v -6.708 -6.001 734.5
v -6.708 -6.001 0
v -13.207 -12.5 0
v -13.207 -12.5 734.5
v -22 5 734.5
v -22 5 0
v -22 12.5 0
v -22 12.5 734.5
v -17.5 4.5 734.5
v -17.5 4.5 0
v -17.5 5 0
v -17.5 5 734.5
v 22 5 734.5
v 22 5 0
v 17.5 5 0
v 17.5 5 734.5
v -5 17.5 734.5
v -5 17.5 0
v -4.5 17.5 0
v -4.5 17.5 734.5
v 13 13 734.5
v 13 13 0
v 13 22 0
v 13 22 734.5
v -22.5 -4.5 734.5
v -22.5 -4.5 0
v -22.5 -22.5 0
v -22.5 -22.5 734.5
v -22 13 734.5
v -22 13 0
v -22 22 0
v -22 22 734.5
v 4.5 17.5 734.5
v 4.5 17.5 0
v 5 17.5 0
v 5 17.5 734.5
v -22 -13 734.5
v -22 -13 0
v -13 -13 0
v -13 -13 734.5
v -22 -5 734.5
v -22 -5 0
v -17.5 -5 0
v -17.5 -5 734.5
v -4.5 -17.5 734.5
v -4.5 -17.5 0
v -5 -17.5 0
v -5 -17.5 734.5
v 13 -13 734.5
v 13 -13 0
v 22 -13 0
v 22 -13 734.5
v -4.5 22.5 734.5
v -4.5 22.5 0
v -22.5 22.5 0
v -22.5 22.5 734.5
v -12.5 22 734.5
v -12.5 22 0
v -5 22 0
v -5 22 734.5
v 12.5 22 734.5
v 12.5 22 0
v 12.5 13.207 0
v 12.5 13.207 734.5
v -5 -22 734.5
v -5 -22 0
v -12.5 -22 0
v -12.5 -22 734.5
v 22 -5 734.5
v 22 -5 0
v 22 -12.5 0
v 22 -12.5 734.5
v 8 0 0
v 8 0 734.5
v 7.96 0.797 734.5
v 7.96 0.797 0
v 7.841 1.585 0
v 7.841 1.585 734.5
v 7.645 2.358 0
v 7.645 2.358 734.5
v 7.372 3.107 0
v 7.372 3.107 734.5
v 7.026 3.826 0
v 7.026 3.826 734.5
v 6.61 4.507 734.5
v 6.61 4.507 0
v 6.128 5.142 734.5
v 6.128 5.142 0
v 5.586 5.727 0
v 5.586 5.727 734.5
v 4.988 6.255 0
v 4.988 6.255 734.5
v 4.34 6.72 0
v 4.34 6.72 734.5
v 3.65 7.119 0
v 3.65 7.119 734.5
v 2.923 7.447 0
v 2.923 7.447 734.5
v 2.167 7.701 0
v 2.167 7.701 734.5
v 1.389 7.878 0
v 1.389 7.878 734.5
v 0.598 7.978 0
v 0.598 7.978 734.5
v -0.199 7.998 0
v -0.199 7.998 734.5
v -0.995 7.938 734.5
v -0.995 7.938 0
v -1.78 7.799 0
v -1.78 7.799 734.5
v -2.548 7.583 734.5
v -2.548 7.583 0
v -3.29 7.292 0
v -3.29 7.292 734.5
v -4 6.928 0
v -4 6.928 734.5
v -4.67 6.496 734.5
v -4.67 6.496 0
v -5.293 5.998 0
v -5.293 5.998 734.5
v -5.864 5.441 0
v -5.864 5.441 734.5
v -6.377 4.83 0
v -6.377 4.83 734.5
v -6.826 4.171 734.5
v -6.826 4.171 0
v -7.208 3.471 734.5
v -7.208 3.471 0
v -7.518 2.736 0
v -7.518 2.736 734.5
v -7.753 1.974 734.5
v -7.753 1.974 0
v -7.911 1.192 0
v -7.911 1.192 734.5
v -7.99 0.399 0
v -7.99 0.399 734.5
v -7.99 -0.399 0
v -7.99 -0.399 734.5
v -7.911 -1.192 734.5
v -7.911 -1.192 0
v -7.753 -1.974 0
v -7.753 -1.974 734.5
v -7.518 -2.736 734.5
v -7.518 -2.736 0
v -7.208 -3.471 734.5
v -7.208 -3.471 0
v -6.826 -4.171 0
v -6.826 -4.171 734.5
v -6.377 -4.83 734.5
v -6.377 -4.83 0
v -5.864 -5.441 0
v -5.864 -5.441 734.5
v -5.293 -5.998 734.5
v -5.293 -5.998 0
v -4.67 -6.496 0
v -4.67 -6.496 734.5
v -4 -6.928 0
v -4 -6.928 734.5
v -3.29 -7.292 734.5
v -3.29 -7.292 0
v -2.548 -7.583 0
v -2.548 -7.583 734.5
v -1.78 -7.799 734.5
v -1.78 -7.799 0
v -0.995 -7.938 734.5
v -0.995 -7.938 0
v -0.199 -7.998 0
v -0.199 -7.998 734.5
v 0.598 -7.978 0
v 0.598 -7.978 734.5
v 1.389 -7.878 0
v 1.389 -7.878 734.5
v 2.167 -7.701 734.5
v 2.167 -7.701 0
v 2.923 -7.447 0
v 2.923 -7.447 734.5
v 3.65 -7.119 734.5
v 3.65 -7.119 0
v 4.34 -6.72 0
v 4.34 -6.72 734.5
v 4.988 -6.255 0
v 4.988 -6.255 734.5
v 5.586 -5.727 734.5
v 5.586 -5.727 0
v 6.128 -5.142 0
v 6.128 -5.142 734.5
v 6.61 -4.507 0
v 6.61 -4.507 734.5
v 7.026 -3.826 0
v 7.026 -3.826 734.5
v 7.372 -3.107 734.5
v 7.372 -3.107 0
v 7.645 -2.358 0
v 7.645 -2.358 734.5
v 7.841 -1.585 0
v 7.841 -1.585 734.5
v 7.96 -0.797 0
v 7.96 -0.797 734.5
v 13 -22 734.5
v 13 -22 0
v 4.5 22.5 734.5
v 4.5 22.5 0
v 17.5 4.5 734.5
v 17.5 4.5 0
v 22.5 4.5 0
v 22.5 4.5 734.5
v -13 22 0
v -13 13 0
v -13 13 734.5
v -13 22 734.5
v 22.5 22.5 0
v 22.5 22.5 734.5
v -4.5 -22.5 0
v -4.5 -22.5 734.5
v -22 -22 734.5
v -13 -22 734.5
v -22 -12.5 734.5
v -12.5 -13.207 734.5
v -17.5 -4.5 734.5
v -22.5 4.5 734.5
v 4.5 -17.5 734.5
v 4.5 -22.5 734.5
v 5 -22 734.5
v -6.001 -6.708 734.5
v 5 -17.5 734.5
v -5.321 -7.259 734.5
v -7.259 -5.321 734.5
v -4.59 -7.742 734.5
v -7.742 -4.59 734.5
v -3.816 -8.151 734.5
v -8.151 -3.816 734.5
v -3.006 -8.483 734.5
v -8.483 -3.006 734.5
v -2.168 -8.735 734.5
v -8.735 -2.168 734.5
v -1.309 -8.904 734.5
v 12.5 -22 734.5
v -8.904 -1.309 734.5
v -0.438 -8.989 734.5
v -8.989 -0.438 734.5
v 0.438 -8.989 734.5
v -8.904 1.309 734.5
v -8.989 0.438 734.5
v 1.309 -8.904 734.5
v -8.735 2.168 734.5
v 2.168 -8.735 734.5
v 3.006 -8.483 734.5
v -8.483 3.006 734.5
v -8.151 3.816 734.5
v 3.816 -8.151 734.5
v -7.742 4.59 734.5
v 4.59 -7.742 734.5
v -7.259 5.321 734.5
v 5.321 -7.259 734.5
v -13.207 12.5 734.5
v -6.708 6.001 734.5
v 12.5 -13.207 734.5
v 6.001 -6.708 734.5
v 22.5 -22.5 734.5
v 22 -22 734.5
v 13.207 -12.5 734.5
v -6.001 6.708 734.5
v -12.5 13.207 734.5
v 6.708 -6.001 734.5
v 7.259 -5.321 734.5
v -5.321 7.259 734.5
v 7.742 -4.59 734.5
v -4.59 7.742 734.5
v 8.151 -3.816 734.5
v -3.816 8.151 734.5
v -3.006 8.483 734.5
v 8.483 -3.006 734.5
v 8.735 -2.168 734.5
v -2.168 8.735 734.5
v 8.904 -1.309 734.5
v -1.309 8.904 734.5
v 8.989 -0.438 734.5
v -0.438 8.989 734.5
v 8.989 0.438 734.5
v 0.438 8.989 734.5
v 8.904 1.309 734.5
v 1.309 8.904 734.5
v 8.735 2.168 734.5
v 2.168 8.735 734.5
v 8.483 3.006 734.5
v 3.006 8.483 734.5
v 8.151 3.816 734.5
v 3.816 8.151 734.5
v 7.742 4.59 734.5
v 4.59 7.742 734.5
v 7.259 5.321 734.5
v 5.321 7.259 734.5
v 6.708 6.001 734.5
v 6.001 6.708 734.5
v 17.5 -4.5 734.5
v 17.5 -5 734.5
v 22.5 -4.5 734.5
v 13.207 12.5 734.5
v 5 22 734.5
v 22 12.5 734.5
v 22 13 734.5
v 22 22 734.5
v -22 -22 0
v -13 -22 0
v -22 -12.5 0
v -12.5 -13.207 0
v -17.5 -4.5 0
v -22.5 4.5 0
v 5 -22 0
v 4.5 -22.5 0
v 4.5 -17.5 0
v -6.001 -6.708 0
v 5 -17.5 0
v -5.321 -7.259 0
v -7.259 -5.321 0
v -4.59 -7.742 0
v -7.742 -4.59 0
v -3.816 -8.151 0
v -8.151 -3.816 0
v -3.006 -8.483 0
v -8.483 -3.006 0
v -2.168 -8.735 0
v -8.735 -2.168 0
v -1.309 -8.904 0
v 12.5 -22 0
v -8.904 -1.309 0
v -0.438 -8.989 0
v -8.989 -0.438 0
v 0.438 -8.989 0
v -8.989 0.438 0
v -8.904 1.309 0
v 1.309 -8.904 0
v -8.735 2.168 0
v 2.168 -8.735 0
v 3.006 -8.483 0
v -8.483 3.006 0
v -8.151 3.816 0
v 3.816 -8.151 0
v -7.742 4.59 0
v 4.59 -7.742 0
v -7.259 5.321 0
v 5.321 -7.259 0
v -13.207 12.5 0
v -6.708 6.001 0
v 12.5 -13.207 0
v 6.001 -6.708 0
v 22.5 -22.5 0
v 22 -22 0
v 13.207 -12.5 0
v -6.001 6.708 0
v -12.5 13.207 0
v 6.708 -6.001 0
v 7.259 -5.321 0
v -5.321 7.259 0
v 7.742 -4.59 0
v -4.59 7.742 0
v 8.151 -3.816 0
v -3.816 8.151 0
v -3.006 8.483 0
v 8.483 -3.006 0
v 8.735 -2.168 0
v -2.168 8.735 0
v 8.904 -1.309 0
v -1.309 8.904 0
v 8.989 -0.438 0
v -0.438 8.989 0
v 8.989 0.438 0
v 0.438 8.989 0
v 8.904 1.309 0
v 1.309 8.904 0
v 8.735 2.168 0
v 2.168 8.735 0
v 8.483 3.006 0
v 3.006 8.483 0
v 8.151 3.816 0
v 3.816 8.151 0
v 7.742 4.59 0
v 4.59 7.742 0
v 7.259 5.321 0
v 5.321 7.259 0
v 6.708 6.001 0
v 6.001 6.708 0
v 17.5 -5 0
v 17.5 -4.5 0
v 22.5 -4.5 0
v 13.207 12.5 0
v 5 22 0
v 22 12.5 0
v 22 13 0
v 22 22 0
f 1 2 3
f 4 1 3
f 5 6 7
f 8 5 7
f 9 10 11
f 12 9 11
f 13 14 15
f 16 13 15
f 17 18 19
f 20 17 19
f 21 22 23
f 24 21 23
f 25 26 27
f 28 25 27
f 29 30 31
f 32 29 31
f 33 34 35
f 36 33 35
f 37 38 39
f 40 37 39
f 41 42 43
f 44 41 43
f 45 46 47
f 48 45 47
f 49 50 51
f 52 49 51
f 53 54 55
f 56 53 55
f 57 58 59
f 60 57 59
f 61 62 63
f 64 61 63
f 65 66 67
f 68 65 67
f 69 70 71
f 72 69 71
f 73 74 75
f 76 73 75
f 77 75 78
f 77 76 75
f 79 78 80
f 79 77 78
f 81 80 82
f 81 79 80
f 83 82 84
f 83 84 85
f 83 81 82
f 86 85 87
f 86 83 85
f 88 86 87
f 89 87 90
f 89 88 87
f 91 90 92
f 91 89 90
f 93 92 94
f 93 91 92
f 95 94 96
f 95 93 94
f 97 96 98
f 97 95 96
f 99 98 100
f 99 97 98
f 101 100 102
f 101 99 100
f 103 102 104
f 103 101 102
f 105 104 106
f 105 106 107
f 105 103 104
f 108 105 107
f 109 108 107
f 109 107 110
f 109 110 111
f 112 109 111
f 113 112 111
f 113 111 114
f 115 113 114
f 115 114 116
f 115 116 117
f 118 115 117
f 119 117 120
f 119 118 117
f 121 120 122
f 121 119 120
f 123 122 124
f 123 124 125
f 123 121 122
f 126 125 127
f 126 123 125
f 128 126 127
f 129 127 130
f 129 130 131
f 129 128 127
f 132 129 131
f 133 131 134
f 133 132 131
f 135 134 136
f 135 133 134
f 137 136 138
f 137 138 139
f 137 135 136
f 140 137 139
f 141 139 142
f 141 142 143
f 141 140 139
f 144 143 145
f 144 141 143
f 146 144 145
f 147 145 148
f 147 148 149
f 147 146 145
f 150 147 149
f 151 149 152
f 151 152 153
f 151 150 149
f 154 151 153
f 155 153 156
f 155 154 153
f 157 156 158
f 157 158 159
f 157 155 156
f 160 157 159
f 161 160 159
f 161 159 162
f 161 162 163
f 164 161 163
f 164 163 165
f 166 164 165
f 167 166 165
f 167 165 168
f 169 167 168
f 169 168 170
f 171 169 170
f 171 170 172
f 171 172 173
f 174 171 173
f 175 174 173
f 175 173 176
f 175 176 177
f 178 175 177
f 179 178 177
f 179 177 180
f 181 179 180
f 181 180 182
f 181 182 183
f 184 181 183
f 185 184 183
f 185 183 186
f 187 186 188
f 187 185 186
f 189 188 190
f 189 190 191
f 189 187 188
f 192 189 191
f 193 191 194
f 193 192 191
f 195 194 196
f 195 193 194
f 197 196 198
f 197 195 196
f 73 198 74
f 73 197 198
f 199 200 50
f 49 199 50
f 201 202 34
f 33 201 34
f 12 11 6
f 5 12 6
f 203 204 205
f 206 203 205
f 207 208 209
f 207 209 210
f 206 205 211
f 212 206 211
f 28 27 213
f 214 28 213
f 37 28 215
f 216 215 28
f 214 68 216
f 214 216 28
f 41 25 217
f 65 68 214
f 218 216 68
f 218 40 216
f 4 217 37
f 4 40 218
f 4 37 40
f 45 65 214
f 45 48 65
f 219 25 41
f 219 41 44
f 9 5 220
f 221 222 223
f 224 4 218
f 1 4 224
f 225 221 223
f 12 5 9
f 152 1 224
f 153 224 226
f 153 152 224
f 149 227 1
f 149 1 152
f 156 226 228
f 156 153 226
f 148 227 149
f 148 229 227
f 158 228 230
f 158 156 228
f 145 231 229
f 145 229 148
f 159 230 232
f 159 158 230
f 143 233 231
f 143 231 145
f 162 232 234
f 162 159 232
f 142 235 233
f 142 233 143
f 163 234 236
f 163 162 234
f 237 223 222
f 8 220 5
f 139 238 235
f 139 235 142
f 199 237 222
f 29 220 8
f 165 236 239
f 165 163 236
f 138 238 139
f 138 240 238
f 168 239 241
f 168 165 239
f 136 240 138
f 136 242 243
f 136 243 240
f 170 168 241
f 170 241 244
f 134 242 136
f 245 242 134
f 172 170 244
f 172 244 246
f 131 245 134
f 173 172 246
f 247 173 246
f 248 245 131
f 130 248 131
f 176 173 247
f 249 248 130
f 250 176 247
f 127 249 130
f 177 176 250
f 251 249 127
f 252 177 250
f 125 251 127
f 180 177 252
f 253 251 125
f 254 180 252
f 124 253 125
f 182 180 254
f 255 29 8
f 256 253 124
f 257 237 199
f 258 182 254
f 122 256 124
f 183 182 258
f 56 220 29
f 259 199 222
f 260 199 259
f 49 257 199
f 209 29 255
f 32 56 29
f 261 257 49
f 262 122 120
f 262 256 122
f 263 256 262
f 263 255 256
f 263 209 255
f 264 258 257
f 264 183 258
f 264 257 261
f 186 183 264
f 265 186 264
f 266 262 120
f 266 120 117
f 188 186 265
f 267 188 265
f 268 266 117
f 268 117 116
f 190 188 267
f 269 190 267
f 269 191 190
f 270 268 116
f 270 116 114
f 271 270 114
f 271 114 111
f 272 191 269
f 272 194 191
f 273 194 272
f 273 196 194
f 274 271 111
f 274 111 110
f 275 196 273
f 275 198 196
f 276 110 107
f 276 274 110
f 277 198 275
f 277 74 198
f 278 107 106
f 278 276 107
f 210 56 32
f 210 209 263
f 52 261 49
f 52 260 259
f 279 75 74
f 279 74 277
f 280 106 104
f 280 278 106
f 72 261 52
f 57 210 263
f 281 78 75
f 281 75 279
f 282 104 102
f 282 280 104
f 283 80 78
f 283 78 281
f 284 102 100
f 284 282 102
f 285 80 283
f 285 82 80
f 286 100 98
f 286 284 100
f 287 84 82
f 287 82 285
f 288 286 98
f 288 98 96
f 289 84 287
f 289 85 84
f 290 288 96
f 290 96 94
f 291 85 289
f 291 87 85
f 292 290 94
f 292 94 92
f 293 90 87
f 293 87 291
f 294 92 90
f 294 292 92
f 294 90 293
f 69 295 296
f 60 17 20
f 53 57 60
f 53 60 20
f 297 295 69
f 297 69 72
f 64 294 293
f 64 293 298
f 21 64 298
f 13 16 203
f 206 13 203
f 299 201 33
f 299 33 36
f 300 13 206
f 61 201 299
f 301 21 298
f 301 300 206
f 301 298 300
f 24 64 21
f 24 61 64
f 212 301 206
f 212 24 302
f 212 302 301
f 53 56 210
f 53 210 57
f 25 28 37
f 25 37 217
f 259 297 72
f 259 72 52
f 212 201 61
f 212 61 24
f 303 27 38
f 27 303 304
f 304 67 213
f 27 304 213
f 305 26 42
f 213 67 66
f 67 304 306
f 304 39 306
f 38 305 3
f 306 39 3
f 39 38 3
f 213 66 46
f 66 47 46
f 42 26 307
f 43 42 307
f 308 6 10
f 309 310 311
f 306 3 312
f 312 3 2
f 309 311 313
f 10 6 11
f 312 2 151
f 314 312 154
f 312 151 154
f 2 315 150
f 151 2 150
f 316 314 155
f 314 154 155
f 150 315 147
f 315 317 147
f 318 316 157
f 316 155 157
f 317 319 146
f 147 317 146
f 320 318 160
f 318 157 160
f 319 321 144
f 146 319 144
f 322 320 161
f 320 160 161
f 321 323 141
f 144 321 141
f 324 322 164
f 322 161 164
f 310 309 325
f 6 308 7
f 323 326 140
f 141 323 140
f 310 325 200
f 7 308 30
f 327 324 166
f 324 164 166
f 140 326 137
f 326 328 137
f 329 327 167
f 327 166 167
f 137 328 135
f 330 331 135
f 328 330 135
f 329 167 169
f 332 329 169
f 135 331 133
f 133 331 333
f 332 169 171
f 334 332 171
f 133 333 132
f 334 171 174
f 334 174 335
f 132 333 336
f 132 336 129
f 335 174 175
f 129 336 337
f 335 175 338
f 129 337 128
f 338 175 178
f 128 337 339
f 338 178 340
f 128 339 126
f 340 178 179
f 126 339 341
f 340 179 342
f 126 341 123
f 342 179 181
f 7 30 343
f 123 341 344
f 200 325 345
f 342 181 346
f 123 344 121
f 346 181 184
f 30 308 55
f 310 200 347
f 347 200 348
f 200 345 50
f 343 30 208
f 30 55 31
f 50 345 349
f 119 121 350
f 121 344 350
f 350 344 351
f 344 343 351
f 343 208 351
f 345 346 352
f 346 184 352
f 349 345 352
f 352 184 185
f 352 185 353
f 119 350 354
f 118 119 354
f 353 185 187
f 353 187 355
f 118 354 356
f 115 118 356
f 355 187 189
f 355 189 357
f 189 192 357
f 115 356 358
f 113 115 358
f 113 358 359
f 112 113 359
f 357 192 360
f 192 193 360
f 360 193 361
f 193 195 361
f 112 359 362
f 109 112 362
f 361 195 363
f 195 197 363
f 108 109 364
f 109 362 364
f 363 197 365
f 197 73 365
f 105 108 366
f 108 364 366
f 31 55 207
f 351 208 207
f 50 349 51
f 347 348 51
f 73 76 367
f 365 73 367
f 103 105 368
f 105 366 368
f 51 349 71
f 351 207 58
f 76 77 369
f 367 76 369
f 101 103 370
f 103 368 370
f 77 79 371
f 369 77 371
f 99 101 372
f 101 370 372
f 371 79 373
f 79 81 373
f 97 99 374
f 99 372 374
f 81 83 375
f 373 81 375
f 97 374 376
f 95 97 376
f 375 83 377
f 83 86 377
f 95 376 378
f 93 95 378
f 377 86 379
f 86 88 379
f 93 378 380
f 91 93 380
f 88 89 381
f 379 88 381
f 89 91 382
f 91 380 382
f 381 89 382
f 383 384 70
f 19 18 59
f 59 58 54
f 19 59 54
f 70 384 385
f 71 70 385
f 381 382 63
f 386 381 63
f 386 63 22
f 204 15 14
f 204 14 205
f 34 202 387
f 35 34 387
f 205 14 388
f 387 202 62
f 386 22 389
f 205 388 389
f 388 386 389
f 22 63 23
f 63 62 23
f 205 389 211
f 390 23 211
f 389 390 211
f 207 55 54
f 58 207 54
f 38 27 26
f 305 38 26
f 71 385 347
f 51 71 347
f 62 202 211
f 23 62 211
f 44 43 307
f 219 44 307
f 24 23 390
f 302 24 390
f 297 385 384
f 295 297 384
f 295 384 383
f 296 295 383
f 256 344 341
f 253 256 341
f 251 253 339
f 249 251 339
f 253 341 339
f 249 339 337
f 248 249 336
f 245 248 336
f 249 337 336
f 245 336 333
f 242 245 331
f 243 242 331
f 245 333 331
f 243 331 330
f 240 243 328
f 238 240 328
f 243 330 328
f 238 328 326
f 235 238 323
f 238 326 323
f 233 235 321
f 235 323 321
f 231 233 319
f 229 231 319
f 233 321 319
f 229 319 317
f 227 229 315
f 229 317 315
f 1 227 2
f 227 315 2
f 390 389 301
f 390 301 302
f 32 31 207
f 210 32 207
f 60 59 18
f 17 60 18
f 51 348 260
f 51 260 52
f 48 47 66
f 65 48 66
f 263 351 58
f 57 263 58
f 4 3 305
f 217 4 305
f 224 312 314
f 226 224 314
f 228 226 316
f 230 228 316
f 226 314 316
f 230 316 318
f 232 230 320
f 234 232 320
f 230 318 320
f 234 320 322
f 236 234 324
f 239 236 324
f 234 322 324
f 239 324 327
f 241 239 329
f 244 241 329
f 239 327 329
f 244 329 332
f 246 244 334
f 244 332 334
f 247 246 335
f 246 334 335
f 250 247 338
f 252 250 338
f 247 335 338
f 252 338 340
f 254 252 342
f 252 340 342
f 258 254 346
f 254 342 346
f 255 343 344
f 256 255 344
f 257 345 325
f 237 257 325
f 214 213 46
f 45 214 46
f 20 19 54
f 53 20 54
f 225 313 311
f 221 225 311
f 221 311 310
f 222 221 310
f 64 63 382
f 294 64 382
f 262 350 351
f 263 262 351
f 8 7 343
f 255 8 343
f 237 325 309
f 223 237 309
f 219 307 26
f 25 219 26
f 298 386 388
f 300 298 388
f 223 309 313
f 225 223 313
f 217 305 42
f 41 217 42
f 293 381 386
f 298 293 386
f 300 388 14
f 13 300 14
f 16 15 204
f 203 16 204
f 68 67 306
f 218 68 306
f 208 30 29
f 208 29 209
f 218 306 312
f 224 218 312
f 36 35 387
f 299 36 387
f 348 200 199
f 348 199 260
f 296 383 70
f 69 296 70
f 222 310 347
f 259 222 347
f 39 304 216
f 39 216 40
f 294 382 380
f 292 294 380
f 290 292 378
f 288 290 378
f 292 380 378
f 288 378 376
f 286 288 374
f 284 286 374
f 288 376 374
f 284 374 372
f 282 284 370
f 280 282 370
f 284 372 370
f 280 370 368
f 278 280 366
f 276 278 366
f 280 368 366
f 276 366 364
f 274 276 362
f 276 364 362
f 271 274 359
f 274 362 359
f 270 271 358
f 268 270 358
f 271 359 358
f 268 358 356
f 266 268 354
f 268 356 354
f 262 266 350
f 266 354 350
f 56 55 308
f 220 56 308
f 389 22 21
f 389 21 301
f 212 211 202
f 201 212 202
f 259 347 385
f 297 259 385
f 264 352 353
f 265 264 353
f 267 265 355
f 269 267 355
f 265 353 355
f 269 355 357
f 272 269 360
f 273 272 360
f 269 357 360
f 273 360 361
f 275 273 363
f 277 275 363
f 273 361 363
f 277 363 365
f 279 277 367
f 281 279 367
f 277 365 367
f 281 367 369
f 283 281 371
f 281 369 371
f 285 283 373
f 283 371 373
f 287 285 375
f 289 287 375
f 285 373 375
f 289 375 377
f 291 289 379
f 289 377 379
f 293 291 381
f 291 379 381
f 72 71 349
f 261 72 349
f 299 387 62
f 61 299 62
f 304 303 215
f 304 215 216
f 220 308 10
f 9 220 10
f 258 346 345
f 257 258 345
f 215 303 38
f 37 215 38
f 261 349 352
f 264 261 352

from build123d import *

# Parameters (mm, degrees)
ESBO_O1_W                = 9
ESBO_O1_H                = 9
ESBO_O1_R                = 8
RESSALTO_EXTRUS_O4_DEPTH = 734.5


with BuildPart() as part:
    # Esboço1 → Ressalto-extrusão4 (new body)
    with BuildSketch(Plane.XY):
        with BuildLine():
            Line((-4.5, 22.5), (-22.5, 22.5))
            Line((-22.5, 22.5), (-22.5, 4.5))
            Line((-22.5, 4.5), (-17.5, 4.5))
            Line((-17.5, 4.5), (-17.5, 5))
            Line((-17.5, 5), (-22, 5))
            Line((-22, 5), (-22, 12.5))
            Line((-22, 12.5), (-13.207106781, 12.5))
            Line((-13.207106781, 12.5), (-6.707685904, 6.000579123))
            ThreePointArc((-6.707685904, 6.000579123), (-9, 0), (-6.707685904, -6.000579123))
            Line((-6.707685904, -6.000579123), (-13.207106781, -12.5))
            Line((-13.207106781, -12.5), (-22, -12.5))
            Line((-22, -12.5), (-22, -5))
            Line((-22, -5), (-17.5, -5))
            Line((-17.5, -5), (-17.5, -4.5))
            Line((-17.5, -4.5), (-22.5, -4.5))
            Line((-22.5, -4.5), (-22.5, -22.5))
            Line((-22.5, -22.5), (-4.5, -22.5))
            Line((-4.5, -22.5), (-4.5, -17.5))
            Line((-4.5, -17.5), (-5, -17.5))
            Line((-5, -17.5), (-5, -22))
            Line((-5, -22), (-12.5, -22))
            Line((-12.5, -22), (-12.5, -13.207106781))
            Line((-12.5, -13.207106781), (-6.000579123, -6.707685904))
            ThreePointArc((-6.000579123, -6.707685904), (0, -9), (6.000579123, -6.707685904))
            Line((6.000579123, -6.707685904), (12.5, -13.207106781))
            Line((12.5, -13.207106781), (12.5, -22))
            Line((12.5, -22), (5, -22))
            Line((5, -22), (5, -17.5))
            Line((5, -17.5), (4.5, -17.5))
            Line((4.5, -17.5), (4.5, -22.5))
            Line((4.5, -22.5), (22.5, -22.5))
            Line((22.5, -22.5), (22.5, -4.5))
            Line((22.5, -4.5), (17.5, -4.5))
            Line((17.5, -4.5), (17.5, -5))
            Line((17.5, -5), (22, -5))
            Line((22, -5), (22, -12.5))
            Line((22, -12.5), (13.207106781, -12.5))
            Line((13.207106781, -12.5), (6.707685904, -6.000579123))
            ThreePointArc((6.707685904, -6.000579123), (9, 0), (6.707685904, 6.000579123))
            Line((6.707685904, 6.000579123), (13.207106781, 12.5))
            Line((13.207106781, 12.5), (22, 12.5))
            Line((22, 12.5), (22, 5))
            Line((22, 5), (17.5, 5))
            Line((17.5, 5), (17.5, 4.5))
            Line((17.5, 4.5), (22.5, 4.5))
            Line((22.5, 4.5), (22.5, 22.5))
            Line((22.5, 22.5), (4.5, 22.5))
            Line((4.5, 22.5), (4.5, 17.5))
            Line((4.5, 17.5), (5, 17.5))
            Line((5, 17.5), (5, 22))
            Line((5, 22), (12.5, 22))
            Line((12.5, 22), (12.5, 13.207106781))
            Line((12.5, 13.207106781), (6.000579123, 6.707685904))
            ThreePointArc((6.000579123, 6.707685904), (0, 9), (-6.000579123, 6.707685904))
            Line((-6.000579123, 6.707685904), (-12.5, 13.207106781))
            Line((-12.5, 13.207106781), (-12.5, 22))
            Line((-12.5, 22), (-5, 22))
            Line((-5, 22), (-5, 17.5))
            Line((-5, 17.5), (-4.5, 17.5))
            Line((-4.5, 17.5), (-4.5, 22.5))
        make_face()
        with Locations((17.5, 17.5)):
            Rectangle(ESBO_O1_W, ESBO_O1_H, mode=Mode.SUBTRACT)
        with Locations((-17.5, -17.5)):
            Rectangle(ESBO_O1_W, ESBO_O1_H, mode=Mode.SUBTRACT)
        with Locations((17.5, -17.5)):
            Rectangle(ESBO_O1_W, ESBO_O1_H, mode=Mode.SUBTRACT)
        with Locations((-17.5, 17.5)):
            Rectangle(ESBO_O1_W, ESBO_O1_H, mode=Mode.SUBTRACT)
        Circle(ESBO_O1_R, mode=Mode.SUBTRACT)
    extrude(amount=RESSALTO_EXTRUS_O4_DEPTH)


solid = part.part
